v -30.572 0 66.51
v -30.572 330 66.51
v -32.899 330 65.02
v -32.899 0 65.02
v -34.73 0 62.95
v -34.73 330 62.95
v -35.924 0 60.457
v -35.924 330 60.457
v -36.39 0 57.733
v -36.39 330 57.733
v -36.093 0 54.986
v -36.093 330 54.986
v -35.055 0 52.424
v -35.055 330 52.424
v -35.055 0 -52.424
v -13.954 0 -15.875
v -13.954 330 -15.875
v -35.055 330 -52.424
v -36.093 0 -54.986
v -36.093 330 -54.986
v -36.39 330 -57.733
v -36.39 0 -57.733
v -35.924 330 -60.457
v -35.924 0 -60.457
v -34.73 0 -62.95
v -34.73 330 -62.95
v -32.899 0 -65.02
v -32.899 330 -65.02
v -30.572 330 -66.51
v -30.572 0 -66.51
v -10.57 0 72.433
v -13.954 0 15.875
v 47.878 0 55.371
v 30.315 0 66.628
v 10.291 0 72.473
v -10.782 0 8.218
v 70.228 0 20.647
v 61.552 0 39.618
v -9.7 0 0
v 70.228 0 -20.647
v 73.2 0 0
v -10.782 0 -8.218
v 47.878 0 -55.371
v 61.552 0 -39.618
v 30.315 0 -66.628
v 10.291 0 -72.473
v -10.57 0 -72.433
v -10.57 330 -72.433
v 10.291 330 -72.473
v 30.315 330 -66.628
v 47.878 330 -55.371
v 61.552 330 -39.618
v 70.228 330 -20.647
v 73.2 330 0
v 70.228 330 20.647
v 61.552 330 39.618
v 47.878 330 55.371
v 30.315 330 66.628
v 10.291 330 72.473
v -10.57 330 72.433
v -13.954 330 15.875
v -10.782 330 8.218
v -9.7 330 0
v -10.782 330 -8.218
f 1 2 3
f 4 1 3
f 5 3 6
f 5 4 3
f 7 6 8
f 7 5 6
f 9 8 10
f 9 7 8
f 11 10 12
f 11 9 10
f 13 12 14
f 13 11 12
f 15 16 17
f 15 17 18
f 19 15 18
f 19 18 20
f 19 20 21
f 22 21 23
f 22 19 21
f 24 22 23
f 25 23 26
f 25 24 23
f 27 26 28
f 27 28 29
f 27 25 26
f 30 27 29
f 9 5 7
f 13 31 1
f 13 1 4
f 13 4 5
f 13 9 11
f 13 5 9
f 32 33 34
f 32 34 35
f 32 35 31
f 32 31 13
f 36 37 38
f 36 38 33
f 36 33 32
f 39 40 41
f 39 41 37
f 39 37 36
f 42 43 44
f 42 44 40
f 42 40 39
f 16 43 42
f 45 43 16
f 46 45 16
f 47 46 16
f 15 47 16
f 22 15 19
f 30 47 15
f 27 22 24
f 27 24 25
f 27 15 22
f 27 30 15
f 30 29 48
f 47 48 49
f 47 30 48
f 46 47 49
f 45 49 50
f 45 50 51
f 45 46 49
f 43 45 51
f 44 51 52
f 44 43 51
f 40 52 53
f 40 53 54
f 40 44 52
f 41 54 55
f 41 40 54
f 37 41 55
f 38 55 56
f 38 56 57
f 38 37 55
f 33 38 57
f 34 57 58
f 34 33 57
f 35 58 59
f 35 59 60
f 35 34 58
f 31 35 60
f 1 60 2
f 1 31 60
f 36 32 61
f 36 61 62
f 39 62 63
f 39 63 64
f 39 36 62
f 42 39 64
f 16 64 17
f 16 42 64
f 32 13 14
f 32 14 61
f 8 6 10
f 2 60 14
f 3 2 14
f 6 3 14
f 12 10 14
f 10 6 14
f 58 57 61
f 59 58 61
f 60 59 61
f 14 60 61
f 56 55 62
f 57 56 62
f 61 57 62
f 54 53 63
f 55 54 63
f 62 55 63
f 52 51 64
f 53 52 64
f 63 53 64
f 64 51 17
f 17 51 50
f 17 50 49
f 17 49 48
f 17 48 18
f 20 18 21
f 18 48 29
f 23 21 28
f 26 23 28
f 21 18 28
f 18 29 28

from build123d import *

# Parameters (mm, degrees)
BOSS_EXTRUDE1_DEPTH = 330


with BuildPart() as part:
    # Sketch1 → Boss-Extrude1 (new body)
    with BuildSketch(Plane(origin=(0, 0, 0), x_dir=(1, 0, 0), z_dir=(0, 1, 0))):
        with BuildLine():
            Line((-13.95369343, 15.875), (-35.055377431, 52.424188815))
            ThreePointArc((-35.055377431, 52.424188815), (-35.924016074, 60.457372666), (-30.571566968, 66.51029464))
            ThreePointArc((-30.571566968, 66.51029464), (73.2, 0), (-30.571566968, -66.51029464))
            ThreePointArc((-30.571566968, -66.51029464), (-35.924016074, -60.457372666), (-35.055377431, -52.424188815))
            Line((-35.055377431, -52.424188815), (-13.95369343, -15.875))
            ThreePointArc((-13.95369343, -15.875), (-9.7, 0), (-13.95369343, 15.875))
        make_face()
    extrude(amount=BOSS_EXTRUDE1_DEPTH)


solid = part.part
